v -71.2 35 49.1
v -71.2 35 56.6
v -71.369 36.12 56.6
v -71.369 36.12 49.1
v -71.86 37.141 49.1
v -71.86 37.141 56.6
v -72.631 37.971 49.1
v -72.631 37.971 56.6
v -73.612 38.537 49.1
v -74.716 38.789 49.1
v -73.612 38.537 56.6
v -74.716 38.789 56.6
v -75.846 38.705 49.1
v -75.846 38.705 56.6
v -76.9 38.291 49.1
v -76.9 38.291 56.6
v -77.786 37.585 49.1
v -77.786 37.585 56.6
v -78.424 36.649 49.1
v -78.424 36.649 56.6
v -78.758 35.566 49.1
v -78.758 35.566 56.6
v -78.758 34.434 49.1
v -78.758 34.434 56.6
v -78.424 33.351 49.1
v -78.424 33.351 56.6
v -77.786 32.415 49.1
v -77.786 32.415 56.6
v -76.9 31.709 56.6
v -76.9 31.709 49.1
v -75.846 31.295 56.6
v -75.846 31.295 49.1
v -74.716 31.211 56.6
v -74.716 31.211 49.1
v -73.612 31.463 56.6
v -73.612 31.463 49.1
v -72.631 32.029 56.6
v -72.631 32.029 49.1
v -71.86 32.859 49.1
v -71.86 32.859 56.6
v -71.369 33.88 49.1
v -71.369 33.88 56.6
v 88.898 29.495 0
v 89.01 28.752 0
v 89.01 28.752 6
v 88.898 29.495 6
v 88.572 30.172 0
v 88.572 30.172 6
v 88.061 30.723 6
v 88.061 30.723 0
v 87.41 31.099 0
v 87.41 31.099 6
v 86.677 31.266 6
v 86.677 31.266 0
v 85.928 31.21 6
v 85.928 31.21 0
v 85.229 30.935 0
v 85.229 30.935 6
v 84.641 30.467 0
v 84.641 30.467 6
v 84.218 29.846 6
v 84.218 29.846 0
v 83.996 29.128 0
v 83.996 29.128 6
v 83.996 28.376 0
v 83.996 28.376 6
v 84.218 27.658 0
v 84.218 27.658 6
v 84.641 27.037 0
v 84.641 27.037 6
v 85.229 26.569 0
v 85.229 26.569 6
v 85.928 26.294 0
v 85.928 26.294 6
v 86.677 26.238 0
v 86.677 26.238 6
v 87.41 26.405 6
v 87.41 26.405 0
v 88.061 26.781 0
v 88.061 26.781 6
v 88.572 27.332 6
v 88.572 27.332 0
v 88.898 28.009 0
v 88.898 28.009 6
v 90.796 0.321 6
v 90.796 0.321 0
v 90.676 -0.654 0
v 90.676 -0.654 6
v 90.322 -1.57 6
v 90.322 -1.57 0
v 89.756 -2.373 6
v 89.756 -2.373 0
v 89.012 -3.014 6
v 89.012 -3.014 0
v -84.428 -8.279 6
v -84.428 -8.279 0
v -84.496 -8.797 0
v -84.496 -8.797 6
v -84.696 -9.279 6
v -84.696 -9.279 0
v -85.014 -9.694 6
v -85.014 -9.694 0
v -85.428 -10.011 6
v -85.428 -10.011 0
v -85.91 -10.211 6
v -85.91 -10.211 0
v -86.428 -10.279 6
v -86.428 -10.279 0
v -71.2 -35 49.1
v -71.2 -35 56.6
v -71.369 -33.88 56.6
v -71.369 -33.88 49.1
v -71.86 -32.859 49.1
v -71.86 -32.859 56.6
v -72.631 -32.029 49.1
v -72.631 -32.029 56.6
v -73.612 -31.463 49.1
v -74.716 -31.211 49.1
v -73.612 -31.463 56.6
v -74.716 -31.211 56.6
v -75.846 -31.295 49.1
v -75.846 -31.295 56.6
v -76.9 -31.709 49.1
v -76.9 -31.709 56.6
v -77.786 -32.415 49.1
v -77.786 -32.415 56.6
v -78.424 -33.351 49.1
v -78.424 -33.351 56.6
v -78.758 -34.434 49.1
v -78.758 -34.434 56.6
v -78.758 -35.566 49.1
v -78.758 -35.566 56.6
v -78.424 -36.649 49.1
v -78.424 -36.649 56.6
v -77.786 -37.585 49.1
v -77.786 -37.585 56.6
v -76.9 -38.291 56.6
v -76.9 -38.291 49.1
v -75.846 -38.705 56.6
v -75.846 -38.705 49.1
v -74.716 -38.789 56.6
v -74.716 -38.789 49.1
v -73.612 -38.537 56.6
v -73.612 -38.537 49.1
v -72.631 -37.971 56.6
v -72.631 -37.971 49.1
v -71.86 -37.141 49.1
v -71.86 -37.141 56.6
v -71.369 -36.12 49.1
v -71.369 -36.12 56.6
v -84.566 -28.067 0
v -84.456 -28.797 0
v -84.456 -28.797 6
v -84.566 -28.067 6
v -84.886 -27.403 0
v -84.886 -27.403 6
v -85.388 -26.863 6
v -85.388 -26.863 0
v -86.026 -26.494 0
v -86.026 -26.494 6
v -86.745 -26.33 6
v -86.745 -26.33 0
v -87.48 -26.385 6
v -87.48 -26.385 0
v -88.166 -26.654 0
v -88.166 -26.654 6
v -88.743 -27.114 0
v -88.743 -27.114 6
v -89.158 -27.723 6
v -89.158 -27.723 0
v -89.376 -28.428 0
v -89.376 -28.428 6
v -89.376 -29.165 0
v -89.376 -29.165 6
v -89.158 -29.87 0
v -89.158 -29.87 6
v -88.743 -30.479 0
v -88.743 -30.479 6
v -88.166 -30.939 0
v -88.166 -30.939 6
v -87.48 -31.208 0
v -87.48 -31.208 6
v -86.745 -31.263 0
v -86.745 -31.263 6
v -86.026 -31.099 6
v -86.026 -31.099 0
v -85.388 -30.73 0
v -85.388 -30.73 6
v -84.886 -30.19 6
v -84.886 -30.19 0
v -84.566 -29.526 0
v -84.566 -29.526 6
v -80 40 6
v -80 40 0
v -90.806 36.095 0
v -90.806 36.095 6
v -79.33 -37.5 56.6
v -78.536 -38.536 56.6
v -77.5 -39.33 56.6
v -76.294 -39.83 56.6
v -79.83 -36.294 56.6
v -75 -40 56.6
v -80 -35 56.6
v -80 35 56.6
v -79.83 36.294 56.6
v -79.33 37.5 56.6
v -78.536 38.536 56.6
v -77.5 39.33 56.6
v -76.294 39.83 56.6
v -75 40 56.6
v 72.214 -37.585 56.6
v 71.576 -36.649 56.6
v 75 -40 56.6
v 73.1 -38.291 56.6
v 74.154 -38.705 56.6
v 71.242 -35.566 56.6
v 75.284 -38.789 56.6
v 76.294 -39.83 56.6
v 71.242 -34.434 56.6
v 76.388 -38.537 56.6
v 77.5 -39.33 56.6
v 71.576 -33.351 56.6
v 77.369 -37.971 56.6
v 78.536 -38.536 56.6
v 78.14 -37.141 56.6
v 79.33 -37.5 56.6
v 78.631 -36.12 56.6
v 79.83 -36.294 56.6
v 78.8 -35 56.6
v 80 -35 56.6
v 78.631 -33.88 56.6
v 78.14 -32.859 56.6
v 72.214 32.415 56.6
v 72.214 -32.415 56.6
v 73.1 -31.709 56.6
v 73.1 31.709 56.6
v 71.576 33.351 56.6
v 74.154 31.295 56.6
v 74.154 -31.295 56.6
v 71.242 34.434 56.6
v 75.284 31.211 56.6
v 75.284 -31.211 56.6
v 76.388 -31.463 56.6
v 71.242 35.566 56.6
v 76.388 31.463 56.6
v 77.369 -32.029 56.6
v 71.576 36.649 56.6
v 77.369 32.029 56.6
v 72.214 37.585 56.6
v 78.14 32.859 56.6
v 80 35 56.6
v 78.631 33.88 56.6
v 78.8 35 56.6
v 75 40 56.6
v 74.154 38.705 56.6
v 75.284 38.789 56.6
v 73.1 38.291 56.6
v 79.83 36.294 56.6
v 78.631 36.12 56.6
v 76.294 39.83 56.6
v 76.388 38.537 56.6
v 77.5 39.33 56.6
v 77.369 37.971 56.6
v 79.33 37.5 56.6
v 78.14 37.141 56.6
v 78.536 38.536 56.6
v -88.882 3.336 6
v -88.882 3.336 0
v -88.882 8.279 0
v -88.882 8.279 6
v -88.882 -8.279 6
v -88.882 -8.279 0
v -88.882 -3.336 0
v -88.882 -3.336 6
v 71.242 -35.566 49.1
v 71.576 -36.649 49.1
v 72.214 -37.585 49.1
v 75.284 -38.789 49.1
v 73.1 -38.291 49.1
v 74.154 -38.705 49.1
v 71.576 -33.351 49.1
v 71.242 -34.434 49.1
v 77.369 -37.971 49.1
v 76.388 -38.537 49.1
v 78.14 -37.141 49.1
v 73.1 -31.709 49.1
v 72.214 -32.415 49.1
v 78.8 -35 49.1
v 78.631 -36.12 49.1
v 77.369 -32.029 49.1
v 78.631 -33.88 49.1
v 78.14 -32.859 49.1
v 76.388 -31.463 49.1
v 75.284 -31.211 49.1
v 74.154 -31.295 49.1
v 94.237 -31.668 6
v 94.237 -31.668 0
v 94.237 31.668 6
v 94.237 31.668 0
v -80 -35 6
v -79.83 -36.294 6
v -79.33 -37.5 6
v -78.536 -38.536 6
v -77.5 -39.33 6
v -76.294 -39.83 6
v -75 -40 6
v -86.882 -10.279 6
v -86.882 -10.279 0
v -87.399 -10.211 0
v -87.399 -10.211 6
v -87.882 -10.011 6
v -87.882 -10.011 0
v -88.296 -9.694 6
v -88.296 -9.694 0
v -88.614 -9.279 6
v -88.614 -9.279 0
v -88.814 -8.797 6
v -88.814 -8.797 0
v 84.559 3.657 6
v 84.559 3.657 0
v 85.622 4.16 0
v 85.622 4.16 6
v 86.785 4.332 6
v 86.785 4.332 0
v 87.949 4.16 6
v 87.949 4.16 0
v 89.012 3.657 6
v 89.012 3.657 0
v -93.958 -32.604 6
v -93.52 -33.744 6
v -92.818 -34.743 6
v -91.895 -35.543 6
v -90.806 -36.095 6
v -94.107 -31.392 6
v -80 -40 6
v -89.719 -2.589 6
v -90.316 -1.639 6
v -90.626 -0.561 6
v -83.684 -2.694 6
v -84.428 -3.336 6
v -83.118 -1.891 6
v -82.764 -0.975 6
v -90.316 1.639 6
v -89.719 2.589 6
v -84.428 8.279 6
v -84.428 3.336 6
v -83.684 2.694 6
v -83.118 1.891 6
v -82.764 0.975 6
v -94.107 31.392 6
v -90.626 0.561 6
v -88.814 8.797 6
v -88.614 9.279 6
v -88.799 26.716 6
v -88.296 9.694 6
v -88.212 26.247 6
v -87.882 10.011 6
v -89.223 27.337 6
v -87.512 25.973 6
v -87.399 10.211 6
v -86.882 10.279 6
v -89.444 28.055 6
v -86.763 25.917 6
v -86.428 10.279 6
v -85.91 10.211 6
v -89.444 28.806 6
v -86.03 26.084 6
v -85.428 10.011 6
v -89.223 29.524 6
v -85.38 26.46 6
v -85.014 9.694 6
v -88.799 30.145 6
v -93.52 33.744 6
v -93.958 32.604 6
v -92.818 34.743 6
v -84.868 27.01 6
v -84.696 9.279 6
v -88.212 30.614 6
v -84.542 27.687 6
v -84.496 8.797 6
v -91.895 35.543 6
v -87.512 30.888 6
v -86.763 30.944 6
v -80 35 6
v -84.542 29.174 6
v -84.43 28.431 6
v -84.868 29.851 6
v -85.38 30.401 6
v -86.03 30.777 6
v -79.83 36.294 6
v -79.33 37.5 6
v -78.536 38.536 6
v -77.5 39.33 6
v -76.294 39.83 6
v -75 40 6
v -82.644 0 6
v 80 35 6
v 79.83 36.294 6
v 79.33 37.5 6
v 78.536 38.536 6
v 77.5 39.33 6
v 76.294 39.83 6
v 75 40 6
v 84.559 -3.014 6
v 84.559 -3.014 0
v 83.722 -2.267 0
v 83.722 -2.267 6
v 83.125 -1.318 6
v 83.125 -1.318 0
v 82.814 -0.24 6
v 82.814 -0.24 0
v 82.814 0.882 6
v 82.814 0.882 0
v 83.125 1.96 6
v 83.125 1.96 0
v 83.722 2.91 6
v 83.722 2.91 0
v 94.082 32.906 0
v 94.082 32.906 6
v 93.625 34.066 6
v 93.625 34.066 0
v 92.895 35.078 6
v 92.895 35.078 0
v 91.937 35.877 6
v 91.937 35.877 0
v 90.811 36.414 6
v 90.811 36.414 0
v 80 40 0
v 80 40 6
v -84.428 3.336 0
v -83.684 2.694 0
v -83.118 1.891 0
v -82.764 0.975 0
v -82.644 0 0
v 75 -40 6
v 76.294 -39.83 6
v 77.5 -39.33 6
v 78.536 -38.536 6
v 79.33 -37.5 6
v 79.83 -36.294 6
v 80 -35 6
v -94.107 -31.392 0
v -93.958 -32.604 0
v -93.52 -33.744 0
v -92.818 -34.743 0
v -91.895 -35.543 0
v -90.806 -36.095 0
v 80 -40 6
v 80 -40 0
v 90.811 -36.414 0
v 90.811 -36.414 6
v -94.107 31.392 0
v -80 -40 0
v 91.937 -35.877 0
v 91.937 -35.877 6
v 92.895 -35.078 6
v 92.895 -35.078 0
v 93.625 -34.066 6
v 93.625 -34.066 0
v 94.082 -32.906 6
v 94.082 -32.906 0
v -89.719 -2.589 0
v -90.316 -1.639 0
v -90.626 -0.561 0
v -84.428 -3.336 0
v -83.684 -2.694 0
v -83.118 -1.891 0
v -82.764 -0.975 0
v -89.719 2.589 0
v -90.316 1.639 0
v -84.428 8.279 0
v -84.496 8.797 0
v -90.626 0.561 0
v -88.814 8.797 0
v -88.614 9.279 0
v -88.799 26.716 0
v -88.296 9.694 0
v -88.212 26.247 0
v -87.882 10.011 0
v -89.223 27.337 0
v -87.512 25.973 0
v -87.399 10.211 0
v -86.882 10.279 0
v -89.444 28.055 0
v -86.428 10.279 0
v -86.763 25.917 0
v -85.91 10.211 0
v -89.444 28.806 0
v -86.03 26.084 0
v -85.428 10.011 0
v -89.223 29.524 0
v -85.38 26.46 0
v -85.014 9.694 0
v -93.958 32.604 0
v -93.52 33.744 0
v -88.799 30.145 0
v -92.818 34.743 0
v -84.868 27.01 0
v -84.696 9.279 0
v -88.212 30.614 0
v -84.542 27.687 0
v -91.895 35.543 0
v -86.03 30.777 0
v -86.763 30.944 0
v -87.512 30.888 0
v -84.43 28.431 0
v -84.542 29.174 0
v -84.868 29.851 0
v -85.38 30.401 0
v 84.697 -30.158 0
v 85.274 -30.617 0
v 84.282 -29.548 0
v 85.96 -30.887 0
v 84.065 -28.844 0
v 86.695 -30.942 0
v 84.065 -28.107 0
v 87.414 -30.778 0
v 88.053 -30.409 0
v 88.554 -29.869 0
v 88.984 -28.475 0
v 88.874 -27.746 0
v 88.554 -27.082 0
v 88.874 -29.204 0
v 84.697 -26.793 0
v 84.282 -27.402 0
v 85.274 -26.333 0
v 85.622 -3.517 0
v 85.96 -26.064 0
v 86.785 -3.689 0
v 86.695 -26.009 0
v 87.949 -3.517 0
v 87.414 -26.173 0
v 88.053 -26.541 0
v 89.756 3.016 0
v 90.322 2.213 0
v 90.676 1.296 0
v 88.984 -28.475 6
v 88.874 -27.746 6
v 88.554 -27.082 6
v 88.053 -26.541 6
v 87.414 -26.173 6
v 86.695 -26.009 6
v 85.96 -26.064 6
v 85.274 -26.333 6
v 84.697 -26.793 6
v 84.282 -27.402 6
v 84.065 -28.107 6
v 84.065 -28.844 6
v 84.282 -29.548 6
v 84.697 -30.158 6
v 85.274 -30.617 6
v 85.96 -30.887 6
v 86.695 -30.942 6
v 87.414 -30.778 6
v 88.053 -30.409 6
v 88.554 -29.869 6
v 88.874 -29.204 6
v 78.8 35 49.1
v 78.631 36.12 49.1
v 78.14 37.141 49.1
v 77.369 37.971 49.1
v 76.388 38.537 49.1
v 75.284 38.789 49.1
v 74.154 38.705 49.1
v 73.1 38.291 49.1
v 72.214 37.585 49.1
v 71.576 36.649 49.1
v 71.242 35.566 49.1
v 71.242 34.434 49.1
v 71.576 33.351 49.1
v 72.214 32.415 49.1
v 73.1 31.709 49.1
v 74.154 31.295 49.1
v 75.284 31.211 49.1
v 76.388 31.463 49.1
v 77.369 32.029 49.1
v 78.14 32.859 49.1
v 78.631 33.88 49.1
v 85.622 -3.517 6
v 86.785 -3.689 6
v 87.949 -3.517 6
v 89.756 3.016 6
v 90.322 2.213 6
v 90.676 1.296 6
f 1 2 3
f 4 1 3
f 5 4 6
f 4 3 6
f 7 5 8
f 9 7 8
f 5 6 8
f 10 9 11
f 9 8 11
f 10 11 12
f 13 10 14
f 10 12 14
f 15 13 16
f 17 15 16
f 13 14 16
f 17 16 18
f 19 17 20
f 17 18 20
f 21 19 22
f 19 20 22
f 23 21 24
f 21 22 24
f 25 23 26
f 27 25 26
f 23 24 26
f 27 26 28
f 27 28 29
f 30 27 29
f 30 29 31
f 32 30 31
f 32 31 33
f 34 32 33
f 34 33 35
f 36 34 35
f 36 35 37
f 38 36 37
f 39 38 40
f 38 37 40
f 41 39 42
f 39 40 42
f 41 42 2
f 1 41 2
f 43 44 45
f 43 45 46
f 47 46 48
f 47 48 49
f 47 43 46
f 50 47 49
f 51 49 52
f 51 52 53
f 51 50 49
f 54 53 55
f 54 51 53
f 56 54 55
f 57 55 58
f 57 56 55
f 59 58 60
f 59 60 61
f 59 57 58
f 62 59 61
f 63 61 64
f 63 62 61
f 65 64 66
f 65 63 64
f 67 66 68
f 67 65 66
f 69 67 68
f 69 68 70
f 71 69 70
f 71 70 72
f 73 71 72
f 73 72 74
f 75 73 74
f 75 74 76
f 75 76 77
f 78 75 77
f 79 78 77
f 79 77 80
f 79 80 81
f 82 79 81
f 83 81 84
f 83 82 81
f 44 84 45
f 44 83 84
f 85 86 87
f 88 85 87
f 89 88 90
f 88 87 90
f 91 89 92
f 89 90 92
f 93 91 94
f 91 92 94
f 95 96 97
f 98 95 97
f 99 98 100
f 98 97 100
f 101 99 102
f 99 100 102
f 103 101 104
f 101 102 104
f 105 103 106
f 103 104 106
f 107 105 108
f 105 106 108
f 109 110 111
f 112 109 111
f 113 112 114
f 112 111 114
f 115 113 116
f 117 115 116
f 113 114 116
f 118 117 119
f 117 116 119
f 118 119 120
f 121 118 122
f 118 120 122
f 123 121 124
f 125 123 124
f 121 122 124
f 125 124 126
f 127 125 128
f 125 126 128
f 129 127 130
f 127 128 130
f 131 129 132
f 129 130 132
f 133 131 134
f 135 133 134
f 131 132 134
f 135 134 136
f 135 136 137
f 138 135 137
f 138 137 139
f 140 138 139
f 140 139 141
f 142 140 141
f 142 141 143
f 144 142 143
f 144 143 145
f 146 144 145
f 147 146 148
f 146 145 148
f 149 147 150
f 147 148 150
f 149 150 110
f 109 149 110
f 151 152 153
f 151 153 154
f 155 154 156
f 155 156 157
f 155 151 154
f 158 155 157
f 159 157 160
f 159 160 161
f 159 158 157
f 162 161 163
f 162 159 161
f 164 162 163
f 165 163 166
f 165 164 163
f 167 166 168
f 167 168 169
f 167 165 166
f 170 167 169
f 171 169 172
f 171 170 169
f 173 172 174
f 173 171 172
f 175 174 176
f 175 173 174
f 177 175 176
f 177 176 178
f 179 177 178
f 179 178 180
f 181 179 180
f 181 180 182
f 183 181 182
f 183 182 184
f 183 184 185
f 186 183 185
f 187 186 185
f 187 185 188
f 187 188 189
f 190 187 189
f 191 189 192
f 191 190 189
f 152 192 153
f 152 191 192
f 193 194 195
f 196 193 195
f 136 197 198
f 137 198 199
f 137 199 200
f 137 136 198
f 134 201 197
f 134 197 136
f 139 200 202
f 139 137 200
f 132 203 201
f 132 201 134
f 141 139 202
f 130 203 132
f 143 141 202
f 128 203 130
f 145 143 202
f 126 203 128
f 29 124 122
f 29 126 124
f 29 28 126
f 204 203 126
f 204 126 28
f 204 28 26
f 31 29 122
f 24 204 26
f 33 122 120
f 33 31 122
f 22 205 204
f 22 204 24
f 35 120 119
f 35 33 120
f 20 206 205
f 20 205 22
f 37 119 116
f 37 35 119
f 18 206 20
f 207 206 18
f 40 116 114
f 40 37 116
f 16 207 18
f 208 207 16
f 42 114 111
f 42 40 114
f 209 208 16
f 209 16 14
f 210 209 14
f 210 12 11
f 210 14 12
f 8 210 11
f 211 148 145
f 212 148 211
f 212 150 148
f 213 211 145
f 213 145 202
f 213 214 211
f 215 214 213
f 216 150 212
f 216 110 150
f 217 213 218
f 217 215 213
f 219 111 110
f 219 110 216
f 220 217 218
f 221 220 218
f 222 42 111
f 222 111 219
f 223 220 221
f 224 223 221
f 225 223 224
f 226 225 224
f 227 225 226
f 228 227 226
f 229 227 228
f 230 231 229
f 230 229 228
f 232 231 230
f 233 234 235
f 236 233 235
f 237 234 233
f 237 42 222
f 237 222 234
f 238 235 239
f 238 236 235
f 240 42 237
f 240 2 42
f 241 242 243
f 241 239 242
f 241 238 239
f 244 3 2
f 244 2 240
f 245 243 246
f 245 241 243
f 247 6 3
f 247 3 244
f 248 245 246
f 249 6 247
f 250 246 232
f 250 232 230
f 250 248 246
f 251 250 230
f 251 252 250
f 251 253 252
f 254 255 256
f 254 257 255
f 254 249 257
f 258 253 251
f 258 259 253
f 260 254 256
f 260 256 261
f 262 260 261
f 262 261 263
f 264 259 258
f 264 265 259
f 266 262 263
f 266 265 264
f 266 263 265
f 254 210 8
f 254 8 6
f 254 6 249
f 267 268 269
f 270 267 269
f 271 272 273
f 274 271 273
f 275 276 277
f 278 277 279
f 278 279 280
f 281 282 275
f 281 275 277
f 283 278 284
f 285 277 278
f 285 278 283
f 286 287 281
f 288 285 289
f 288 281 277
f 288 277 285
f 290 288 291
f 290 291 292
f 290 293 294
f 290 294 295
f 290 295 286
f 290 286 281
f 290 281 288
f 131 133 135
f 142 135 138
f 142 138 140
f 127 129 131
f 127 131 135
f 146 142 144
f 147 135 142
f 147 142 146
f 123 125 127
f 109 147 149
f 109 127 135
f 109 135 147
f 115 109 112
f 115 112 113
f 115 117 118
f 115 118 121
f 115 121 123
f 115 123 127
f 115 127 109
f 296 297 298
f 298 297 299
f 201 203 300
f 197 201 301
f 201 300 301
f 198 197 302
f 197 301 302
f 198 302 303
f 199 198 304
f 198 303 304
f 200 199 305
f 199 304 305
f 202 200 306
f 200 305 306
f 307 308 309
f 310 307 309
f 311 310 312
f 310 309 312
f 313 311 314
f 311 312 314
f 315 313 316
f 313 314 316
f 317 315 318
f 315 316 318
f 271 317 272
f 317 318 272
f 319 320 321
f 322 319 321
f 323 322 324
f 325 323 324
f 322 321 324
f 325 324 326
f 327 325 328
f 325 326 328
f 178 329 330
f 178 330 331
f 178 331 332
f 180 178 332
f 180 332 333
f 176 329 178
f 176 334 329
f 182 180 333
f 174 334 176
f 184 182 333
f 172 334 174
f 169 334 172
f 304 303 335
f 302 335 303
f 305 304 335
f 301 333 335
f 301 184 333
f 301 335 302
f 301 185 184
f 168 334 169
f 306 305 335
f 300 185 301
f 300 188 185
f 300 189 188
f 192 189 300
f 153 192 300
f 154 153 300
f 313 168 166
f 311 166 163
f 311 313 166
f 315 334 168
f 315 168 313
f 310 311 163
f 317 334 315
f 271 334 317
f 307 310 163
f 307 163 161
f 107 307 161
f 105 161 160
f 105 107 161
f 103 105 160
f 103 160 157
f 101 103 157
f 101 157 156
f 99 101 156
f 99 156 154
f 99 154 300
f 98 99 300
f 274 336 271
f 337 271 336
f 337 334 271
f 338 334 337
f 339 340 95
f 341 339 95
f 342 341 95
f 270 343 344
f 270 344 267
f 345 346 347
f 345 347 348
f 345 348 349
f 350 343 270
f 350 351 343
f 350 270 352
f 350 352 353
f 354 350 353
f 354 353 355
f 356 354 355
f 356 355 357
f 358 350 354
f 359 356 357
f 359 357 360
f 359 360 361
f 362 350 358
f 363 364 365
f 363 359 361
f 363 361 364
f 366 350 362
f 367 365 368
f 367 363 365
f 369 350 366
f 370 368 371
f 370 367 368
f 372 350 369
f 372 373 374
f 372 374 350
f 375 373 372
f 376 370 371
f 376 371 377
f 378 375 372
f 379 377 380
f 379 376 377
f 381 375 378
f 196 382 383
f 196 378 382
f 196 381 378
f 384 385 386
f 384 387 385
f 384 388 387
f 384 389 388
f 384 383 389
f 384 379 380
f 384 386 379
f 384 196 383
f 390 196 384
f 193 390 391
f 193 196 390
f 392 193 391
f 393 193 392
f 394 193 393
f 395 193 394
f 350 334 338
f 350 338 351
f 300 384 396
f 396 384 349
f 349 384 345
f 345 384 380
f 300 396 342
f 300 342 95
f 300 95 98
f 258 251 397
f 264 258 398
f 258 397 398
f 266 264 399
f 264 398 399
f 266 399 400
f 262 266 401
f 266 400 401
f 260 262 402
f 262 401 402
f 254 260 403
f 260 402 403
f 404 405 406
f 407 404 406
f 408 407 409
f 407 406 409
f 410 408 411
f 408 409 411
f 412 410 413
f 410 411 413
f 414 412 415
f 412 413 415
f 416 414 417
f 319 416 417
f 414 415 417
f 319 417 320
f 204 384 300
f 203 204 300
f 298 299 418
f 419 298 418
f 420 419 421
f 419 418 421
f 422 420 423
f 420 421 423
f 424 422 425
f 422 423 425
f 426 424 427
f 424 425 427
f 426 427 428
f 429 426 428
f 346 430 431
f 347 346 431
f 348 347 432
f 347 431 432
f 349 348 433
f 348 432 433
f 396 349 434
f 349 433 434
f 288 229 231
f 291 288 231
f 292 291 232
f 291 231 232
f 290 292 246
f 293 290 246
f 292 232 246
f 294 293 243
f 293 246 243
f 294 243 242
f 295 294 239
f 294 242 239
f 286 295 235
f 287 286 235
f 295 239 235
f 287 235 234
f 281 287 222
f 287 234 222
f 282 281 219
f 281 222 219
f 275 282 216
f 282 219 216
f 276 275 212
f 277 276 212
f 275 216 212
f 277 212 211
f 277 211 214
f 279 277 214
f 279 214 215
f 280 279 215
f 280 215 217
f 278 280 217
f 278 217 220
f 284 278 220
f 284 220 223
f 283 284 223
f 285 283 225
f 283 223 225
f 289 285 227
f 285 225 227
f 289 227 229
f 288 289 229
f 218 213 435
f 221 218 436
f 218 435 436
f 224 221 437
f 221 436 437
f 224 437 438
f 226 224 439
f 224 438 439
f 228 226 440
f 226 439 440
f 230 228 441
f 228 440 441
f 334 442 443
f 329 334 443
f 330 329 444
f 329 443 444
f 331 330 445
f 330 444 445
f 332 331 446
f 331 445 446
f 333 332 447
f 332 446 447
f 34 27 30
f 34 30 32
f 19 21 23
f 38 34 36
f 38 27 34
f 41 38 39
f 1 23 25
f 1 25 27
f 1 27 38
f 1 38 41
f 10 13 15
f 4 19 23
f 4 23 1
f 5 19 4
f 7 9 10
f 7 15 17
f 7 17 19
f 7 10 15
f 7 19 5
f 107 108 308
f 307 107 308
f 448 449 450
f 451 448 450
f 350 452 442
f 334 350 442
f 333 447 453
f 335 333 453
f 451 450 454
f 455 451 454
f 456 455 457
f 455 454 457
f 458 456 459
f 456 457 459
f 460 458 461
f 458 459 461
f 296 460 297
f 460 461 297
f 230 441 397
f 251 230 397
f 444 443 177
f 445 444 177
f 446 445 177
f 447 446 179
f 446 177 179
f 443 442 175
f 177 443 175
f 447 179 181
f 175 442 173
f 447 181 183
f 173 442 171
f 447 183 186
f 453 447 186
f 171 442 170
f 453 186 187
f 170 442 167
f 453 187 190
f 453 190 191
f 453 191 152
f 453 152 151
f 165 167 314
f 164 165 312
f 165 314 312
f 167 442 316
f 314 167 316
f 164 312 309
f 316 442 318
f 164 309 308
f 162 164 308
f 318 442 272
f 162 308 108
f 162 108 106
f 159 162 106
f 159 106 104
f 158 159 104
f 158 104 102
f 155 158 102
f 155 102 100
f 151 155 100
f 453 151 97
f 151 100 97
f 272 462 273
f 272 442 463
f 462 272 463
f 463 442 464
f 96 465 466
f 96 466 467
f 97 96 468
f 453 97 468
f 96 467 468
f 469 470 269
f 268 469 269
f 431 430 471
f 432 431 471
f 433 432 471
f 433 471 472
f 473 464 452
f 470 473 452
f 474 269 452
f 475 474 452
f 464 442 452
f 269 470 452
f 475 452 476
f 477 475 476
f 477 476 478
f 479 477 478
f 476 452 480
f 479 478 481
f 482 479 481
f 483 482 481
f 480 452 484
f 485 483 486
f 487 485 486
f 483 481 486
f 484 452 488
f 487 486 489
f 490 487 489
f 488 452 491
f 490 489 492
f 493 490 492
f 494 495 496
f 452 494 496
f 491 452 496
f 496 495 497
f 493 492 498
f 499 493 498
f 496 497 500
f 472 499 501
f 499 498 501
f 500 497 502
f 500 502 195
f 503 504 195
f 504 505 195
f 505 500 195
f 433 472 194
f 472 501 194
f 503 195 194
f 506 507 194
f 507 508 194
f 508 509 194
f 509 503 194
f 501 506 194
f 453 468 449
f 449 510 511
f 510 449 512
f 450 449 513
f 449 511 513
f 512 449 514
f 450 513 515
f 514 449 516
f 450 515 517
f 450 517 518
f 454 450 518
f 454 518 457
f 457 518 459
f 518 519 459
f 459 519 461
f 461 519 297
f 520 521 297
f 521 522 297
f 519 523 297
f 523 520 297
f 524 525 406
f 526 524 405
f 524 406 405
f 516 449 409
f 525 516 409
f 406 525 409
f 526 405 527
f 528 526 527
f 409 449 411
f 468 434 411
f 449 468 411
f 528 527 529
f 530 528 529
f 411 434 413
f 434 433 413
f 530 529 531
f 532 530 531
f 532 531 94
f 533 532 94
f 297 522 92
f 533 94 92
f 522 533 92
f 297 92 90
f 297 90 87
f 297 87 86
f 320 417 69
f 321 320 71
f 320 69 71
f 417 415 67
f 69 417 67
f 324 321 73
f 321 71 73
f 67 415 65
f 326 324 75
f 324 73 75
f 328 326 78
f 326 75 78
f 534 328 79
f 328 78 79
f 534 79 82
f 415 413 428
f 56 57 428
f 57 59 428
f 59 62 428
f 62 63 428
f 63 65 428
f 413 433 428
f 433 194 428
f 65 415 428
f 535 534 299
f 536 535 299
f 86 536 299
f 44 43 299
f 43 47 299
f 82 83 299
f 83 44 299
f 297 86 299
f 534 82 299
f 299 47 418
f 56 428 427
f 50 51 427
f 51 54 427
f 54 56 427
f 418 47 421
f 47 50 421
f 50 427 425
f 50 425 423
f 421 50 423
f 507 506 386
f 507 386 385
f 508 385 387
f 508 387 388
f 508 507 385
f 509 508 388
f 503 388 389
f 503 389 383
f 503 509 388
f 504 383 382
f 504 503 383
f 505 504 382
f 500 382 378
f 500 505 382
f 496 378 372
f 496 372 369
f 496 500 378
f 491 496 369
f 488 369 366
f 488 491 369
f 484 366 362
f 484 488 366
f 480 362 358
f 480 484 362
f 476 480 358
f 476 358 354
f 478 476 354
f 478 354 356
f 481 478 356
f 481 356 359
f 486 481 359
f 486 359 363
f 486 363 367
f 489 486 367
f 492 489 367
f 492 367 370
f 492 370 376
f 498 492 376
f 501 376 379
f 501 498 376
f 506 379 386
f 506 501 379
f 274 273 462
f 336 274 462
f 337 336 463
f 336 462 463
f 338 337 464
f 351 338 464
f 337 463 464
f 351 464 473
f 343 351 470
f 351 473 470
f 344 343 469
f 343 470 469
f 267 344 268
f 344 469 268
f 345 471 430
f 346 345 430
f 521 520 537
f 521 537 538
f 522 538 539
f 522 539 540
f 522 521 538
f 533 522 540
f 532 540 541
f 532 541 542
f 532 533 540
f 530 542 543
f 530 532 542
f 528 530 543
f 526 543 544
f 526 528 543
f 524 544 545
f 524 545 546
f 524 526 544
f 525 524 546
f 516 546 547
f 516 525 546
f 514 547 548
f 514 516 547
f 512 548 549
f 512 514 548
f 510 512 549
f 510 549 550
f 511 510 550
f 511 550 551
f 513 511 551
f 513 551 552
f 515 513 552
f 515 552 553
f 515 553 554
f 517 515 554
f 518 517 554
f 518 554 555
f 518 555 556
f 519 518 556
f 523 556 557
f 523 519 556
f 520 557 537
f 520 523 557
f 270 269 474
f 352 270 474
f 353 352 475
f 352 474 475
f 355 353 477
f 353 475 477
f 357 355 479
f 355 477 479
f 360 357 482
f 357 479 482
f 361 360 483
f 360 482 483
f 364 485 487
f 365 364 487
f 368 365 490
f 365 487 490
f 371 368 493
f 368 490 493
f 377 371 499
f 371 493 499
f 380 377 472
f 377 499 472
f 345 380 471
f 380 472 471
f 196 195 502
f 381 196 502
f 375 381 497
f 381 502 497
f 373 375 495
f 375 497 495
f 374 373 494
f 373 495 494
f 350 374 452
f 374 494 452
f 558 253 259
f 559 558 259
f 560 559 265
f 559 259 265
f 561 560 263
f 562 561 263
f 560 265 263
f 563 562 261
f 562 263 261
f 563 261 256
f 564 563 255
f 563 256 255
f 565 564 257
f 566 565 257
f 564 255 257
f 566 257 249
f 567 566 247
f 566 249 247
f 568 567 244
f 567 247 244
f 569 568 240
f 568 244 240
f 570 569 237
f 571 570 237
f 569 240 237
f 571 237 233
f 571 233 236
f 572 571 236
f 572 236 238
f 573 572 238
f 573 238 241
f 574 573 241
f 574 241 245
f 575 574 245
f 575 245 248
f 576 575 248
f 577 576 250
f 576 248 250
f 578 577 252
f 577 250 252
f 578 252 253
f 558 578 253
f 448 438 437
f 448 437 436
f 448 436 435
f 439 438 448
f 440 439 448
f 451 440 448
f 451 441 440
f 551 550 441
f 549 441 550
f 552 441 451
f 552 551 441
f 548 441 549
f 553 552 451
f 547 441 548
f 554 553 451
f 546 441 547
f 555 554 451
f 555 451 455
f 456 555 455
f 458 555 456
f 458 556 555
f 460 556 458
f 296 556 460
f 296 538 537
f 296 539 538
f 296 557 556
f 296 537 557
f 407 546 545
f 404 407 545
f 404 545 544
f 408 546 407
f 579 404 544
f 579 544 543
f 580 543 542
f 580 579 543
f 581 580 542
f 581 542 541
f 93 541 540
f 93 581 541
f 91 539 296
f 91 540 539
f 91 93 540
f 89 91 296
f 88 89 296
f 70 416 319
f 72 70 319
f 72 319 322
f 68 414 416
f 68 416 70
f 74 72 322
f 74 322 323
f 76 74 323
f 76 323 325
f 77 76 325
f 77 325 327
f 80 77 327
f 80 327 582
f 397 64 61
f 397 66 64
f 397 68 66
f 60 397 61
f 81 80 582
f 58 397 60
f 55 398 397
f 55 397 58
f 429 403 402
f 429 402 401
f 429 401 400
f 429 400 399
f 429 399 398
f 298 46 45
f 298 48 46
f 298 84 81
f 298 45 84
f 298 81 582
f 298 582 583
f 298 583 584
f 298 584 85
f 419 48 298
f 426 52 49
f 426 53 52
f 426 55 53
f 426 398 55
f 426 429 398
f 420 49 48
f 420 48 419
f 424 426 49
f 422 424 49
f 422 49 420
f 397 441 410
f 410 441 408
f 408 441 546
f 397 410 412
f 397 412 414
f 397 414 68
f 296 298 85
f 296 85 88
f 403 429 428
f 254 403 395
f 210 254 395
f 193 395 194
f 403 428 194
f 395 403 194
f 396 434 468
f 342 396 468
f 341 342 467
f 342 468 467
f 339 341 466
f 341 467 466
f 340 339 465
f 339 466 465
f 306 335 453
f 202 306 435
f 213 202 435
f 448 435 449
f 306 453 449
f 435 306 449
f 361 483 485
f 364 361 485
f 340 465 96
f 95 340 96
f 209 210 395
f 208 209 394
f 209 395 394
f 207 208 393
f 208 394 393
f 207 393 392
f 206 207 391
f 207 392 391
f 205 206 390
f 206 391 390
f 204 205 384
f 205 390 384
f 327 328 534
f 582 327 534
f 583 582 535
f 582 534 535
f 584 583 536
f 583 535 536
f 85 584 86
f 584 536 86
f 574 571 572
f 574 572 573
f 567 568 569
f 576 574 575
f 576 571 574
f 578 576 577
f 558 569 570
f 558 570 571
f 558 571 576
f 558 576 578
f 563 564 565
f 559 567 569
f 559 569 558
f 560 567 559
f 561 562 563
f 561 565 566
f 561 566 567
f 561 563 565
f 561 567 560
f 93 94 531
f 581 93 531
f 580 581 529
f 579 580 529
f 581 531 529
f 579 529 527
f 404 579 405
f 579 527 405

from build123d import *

# Parameters (mm, degrees)
F0_R     = 2.473433
F0_R_2   = 2.52096
F1_DEPTH = 6
F2_DEPTH = 34
F3_DEPTH = 6
F4_DEPTH = 56.6
F5_R     = 3.8
F6_DEPTH = 7.5


with BuildPart() as f1:
    # F0 (on Top) → F1 (new body)
    with BuildSketch(Plane.XY):
        with BuildLine():
            ThreePointArc((80, 35), (78.535534, 38.535534), (75, 40))
            Line((75, 40), (-75, 40))
            ThreePointArc((-75, 40), (-78.535534, 38.535534), (-80, 35))
            Line((-80, 35), (-80, -35))
            ThreePointArc((-80, -35), (-78.535534, -38.535534), (-75, -40))
            Line((-75, -40), (75, -40))
            ThreePointArc((75, -40), (78.535534, -38.535534), (80, -35))
            Line((80, -35), (80, 35))
        make_face()
        with BuildLine():
            ThreePointArc((-68, 34.468334), (-67.12132, 36.589654), (-65, 37.468334))
            Line((-65, 37.468334), (0, 37.468334))
            Line((0, 37.468334), (65, 37.468334))
            ThreePointArc((65, 37.468334), (67.12132, 36.589654), (68, 34.468334))
            Line((68, 34.468334), (68, 22.468334))
            ThreePointArc((68, 22.468334), (68.87868, 20.347013), (71, 19.468334))
            Line((71, 19.468334), (74.173963, 19.468334))
            ThreePointArc((74.173963, 19.468334), (76.295284, 18.589654), (77.173963, 16.468334))
            Line((77.173963, 16.468334), (77.173963, -16.485134))
            ThreePointArc((77.173963, -16.485134), (76.295284, -18.606454), (74.173963, -19.485134))
            Line((74.173963, -19.485134), (71, -19.485134))
            ThreePointArc((71, -19.485134), (68.87868, -20.363814), (68, -22.485134))
            Line((68, -22.485134), (68, -34.485134))
            ThreePointArc((68, -34.485134), (67.12132, -36.606454), (65, -37.485134))
            Line((65, -37.485134), (0, -37.485134))
            Line((0, -37.485134), (-65, -37.485134))
            ThreePointArc((-65, -37.485134), (-67.12132, -36.606454), (-68, -34.485134))
            Line((-68, -34.485134), (-68, -22.546155))
            ThreePointArc((-68, -22.546155), (-68.900143, -20.403586), (-71.060401, -19.546763))
            Line((-71.060401, -19.546763), (-74.027314, -19.60651))
            ThreePointArc((-74.027314, -19.60651), (-76.187572, -18.749687), (-77.087715, -16.607118))
            Line((-77.087715, -16.607118), (-77.087715, 16.468334))
            ThreePointArc((-77.087715, 16.468334), (-76.209036, 18.589654), (-74.087715, 19.468334))
            Line((-74.087715, 19.468334), (-71, 19.468334))
            ThreePointArc((-71, 19.468334), (-68.87868, 20.347013), (-68, 22.468334))
            Line((-68, 22.468334), (-68, 34.468334))
        make_face(mode=Mode.SUBTRACT)
        with BuildLine():
            Line((80, 40), (75, 40))
            ThreePointArc((75, 40), (78.535534, 38.535534), (80, 35))
            Line((80, 35), (80, -35))
            ThreePointArc((80, -35), (78.535534, -38.535534), (75, -40))
            Line((75, -40), (80, -40))
            Line((80, -40), (90.811371, -36.414082))
            ThreePointArc((90.811371, -36.414082), (93.291328, -34.594887), (94.237295, -31.668317))
            Line((94.237295, -31.668317), (94.237295, 31.668317))
            ThreePointArc((94.237295, 31.668317), (93.291328, 34.594887), (90.811371, 36.414082))
            Line((90.811371, 36.414082), (80, 40))
        make_face()
        with Locations((86.510646, -28.475207)):
            Circle(F0_R, mode=Mode.SUBTRACT)
        with BuildLine():
            ThreePointArc((90.796184, 0.321328), (90.322187, -1.570108), (89.012231, -3.014482))
            ThreePointArc((89.012231, -3.014482), (86.785394, -3.689461), (84.558557, -3.014482))
            ThreePointArc((84.558557, -3.014482), (82.774604, 0.321328), (84.558557, 3.657139))
            ThreePointArc((84.558557, 3.657139), (86.785394, 4.332118), (89.012231, 3.657139))
            ThreePointArc((89.012231, 3.657139), (90.322187, 2.212764), (90.796184, 0.321328))
        make_face(mode=Mode.SUBTRACT)
        with Locations((86.489025, 28.75185)):
            Circle(F0_R_2, mode=Mode.SUBTRACT)
        with BuildLine():
            ThreePointArc((-80, 35), (-78.535534, 38.535534), (-75, 40))
            Line((-75, 40), (-80, 40))
            Line((-80, 40), (-90.806432, 36.094616))
            ThreePointArc((-90.806432, 36.094616), (-93.199525, 34.264815), (-94.107032, 31.392273))
            Line((-94.107032, 31.392273), (-94.107032, -31.392273))
            ThreePointArc((-94.107032, -31.392273), (-93.199525, -34.264815), (-90.806432, -36.094616))
            Line((-90.806432, -36.094616), (-80, -40))
            Line((-80, -40), (-75, -40))
            ThreePointArc((-75, -40), (-78.535534, -38.535534), (-80, -35))
            Line((-80, -35), (-80, 35))
        make_face()
        with Locations((-86.929694, -28.796535)):
            Circle(F0_R, mode=Mode.SUBTRACT)
        with BuildLine():
            ThreePointArc((-84.428109, -8.279438), (-85.013896, -9.693651), (-86.428109, -10.279438))
            Line((-86.428109, -10.279438), (-86.881783, -10.279438))
            ThreePointArc((-86.881783, -10.279438), (-88.295997, -9.693651), (-88.881783, -8.279438))
            Line((-88.881783, -8.279438), (-88.881783, -3.335811))
            ThreePointArc((-88.881783, -3.335811), (-90.665736, 0), (-88.881783, 3.335811))
            Line((-88.881783, 3.335811), (-88.881783, 8.279438))
            ThreePointArc((-88.881783, 8.279438), (-88.295997, 9.693651), (-86.881783, 10.279438))
            Line((-86.881783, 10.279438), (-86.428109, 10.279438))
            ThreePointArc((-86.428109, 10.279438), (-85.013896, 9.693651), (-84.428109, 8.279438))
            Line((-84.428109, 8.279438), (-84.428109, 3.335811))
            ThreePointArc((-84.428109, 3.335811), (-83.118153, 1.891436), (-82.644156, 0))
            ThreePointArc((-82.644156, 0), (-83.118153, -1.891436), (-84.428109, -3.335811))
            Line((-84.428109, -3.335811), (-84.428109, -8.279438))
        make_face(mode=Mode.SUBTRACT)
        with Locations((-86.951315, 28.430521)):
            Circle(F0_R_2, mode=Mode.SUBTRACT)
    extrude(amount=F1_DEPTH)

    # F0 (on Top) → F2 (join)
    with BuildSketch(Plane.XY):
        with BuildLine():
            ThreePointArc((80, 35), (78.535534, 38.535534), (75, 40))
            Line((75, 40), (-75, 40))
            ThreePointArc((-75, 40), (-78.535534, 38.535534), (-80, 35))
            Line((-80, 35), (-80, -35))
            ThreePointArc((-80, -35), (-78.535534, -38.535534), (-75, -40))
            Line((-75, -40), (75, -40))
            ThreePointArc((75, -40), (78.535534, -38.535534), (80, -35))
            Line((80, -35), (80, 35))
        make_face()
        with BuildLine():
            ThreePointArc((-68, 34.468334), (-67.12132, 36.589654), (-65, 37.468334))
            Line((-65, 37.468334), (0, 37.468334))
            Line((0, 37.468334), (65, 37.468334))
            ThreePointArc((65, 37.468334), (67.12132, 36.589654), (68, 34.468334))
            Line((68, 34.468334), (68, 22.468334))
            ThreePointArc((68, 22.468334), (68.87868, 20.347013), (71, 19.468334))
            Line((71, 19.468334), (74.173963, 19.468334))
            ThreePointArc((74.173963, 19.468334), (76.295284, 18.589654), (77.173963, 16.468334))
            Line((77.173963, 16.468334), (77.173963, -16.485134))
            ThreePointArc((77.173963, -16.485134), (76.295284, -18.606454), (74.173963, -19.485134))
            Line((74.173963, -19.485134), (71, -19.485134))
            ThreePointArc((71, -19.485134), (68.87868, -20.363814), (68, -22.485134))
            Line((68, -22.485134), (68, -34.485134))
            ThreePointArc((68, -34.485134), (67.12132, -36.606454), (65, -37.485134))
            Line((65, -37.485134), (0, -37.485134))
            Line((0, -37.485134), (-65, -37.485134))
            ThreePointArc((-65, -37.485134), (-67.12132, -36.606454), (-68, -34.485134))
            Line((-68, -34.485134), (-68, -22.546155))
            ThreePointArc((-68, -22.546155), (-68.900143, -20.403586), (-71.060401, -19.546763))
            Line((-71.060401, -19.546763), (-74.027314, -19.60651))
            ThreePointArc((-74.027314, -19.60651), (-76.187572, -18.749687), (-77.087715, -16.607118))
            Line((-77.087715, -16.607118), (-77.087715, 16.468334))
            ThreePointArc((-77.087715, 16.468334), (-76.209036, 18.589654), (-74.087715, 19.468334))
            Line((-74.087715, 19.468334), (-71, 19.468334))
            ThreePointArc((-71, 19.468334), (-68.87868, 20.347013), (-68, 22.468334))
            Line((-68, 22.468334), (-68, 34.468334))
        make_face(mode=Mode.SUBTRACT)
    extrude(amount=F2_DEPTH)

    # F0 (on Top) → F3 (join)
    with BuildSketch(Plane.XY):
        with BuildLine():
            Line((0, 37.468334), (-65, 37.468334))
            ThreePointArc((-65, 37.468334), (-67.12132, 36.589654), (-68, 34.468334))
            Line((-68, 34.468334), (-68, 22.468334))
            ThreePointArc((-68, 22.468334), (-68.87868, 20.347013), (-71, 19.468334))
            Line((-71, 19.468334), (-74.087715, 19.468334))
            ThreePointArc((-74.087715, 19.468334), (-76.209036, 18.589654), (-77.087715, 16.468334))
            Line((-77.087715, 16.468334), (-77.087715, -16.607118))
            ThreePointArc((-77.087715, -16.607118), (-76.187572, -18.749687), (-74.027314, -19.60651))
            Line((-74.027314, -19.60651), (-71.060401, -19.546763))
            ThreePointArc((-71.060401, -19.546763), (-68.900143, -20.403586), (-68, -22.546155))
            Line((-68, -22.546155), (-68, -34.485134))
            ThreePointArc((-68, -34.485134), (-67.12132, -36.606454), (-65, -37.485134))
            Line((-65, -37.485134), (0, -37.485134))
            Line((0, -37.485134), (65, -37.485134))
            ThreePointArc((65, -37.485134), (67.12132, -36.606454), (68, -34.485134))
            Line((68, -34.485134), (68, -22.485134))
            ThreePointArc((68, -22.485134), (68.87868, -20.363814), (71, -19.485134))
            Line((71, -19.485134), (74.173963, -19.485134))
            ThreePointArc((74.173963, -19.485134), (76.295284, -18.606454), (77.173963, -16.485134))
            Line((77.173963, -16.485134), (77.173963, 16.468334))
            ThreePointArc((77.173963, 16.468334), (76.295284, 18.589654), (74.173963, 19.468334))
            Line((74.173963, 19.468334), (71, 19.468334))
            ThreePointArc((71, 19.468334), (68.87868, 20.347013), (68, 22.468334))
            Line((68, 22.468334), (68, 34.468334))
            ThreePointArc((68, 34.468334), (67.12132, 36.589654), (65, 37.468334))
            Line((65, 37.468334), (0, 37.468334))
        make_face()
        with BuildLine():
            ThreePointArc((80, 35), (78.535534, 38.535534), (75, 40))
            Line((75, 40), (-75, 40))
            ThreePointArc((-75, 40), (-78.535534, 38.535534), (-80, 35))
            Line((-80, 35), (-80, -35))
            ThreePointArc((-80, -35), (-78.535534, -38.535534), (-75, -40))
            Line((-75, -40), (75, -40))
            ThreePointArc((75, -40), (78.535534, -38.535534), (80, -35))
            Line((80, -35), (80, 35))
        make_face()
        with BuildLine():
            ThreePointArc((-68, 34.468334), (-67.12132, 36.589654), (-65, 37.468334))
            Line((-65, 37.468334), (0, 37.468334))
            Line((0, 37.468334), (65, 37.468334))
            ThreePointArc((65, 37.468334), (67.12132, 36.589654), (68, 34.468334))
            Line((68, 34.468334), (68, 22.468334))
            ThreePointArc((68, 22.468334), (68.87868, 20.347013), (71, 19.468334))
            Line((71, 19.468334), (74.173963, 19.468334))
            ThreePointArc((74.173963, 19.468334), (76.295284, 18.589654), (77.173963, 16.468334))
            Line((77.173963, 16.468334), (77.173963, -16.485134))
            ThreePointArc((77.173963, -16.485134), (76.295284, -18.606454), (74.173963, -19.485134))
            Line((74.173963, -19.485134), (71, -19.485134))
            ThreePointArc((71, -19.485134), (68.87868, -20.363814), (68, -22.485134))
            Line((68, -22.485134), (68, -34.485134))
            ThreePointArc((68, -34.485134), (67.12132, -36.606454), (65, -37.485134))
            Line((65, -37.485134), (0, -37.485134))
            Line((0, -37.485134), (-65, -37.485134))
            ThreePointArc((-65, -37.485134), (-67.12132, -36.606454), (-68, -34.485134))
            Line((-68, -34.485134), (-68, -22.546155))
            ThreePointArc((-68, -22.546155), (-68.900143, -20.403586), (-71.060401, -19.546763))
            Line((-71.060401, -19.546763), (-74.027314, -19.60651))
            ThreePointArc((-74.027314, -19.60651), (-76.187572, -18.749687), (-77.087715, -16.607118))
            Line((-77.087715, -16.607118), (-77.087715, 16.468334))
            ThreePointArc((-77.087715, 16.468334), (-76.209036, 18.589654), (-74.087715, 19.468334))
            Line((-74.087715, 19.468334), (-71, 19.468334))
            ThreePointArc((-71, 19.468334), (-68.87868, 20.347013), (-68, 22.468334))
            Line((-68, 22.468334), (-68, 34.468334))
        make_face(mode=Mode.SUBTRACT)
        with BuildLine():
            ThreePointArc((-80, 35), (-78.535534, 38.535534), (-75, 40))
            Line((-75, 40), (-80, 40))
            Line((-80, 40), (-90.806432, 36.094616))
            ThreePointArc((-90.806432, 36.094616), (-93.199525, 34.264815), (-94.107032, 31.392273))
            Line((-94.107032, 31.392273), (-94.107032, -31.392273))
            ThreePointArc((-94.107032, -31.392273), (-93.199525, -34.264815), (-90.806432, -36.094616))
            Line((-90.806432, -36.094616), (-80, -40))
            Line((-80, -40), (-75, -40))
            ThreePointArc((-75, -40), (-78.535534, -38.535534), (-80, -35))
            Line((-80, -35), (-80, 35))
        make_face()
        with Locations((-86.929694, -28.796535)):
            Circle(F0_R, mode=Mode.SUBTRACT)
        with BuildLine():
            ThreePointArc((-84.428109, -8.279438), (-85.013896, -9.693651), (-86.428109, -10.279438))
            Line((-86.428109, -10.279438), (-86.881783, -10.279438))
            ThreePointArc((-86.881783, -10.279438), (-88.295997, -9.693651), (-88.881783, -8.279438))
            Line((-88.881783, -8.279438), (-88.881783, -3.335811))
            ThreePointArc((-88.881783, -3.335811), (-90.665736, 0), (-88.881783, 3.335811))
            Line((-88.881783, 3.335811), (-88.881783, 8.279438))
            ThreePointArc((-88.881783, 8.279438), (-88.295997, 9.693651), (-86.881783, 10.279438))
            Line((-86.881783, 10.279438), (-86.428109, 10.279438))
            ThreePointArc((-86.428109, 10.279438), (-85.013896, 9.693651), (-84.428109, 8.279438))
            Line((-84.428109, 8.279438), (-84.428109, 3.335811))
            ThreePointArc((-84.428109, 3.335811), (-83.118153, 1.891436), (-82.644156, 0))
            ThreePointArc((-82.644156, 0), (-83.118153, -1.891436), (-84.428109, -3.335811))
            Line((-84.428109, -3.335811), (-84.428109, -8.279438))
        make_face(mode=Mode.SUBTRACT)
        with Locations((-86.951315, 28.430521)):
            Circle(F0_R_2, mode=Mode.SUBTRACT)
        with BuildLine():
            Line((80, 40), (75, 40))
            ThreePointArc((75, 40), (78.535534, 38.535534), (80, 35))
            Line((80, 35), (80, -35))
            ThreePointArc((80, -35), (78.535534, -38.535534), (75, -40))
            Line((75, -40), (80, -40))
            Line((80, -40), (90.811371, -36.414082))
            ThreePointArc((90.811371, -36.414082), (93.291328, -34.594887), (94.237295, -31.668317))
            Line((94.237295, -31.668317), (94.237295, 31.668317))
            ThreePointArc((94.237295, 31.668317), (93.291328, 34.594887), (90.811371, 36.414082))
            Line((90.811371, 36.414082), (80, 40))
        make_face()
        with Locations((86.510646, -28.475207)):
            Circle(F0_R, mode=Mode.SUBTRACT)
        with BuildLine():
            ThreePointArc((90.796184, 0.321328), (90.322187, -1.570108), (89.012231, -3.014482))
            ThreePointArc((89.012231, -3.014482), (86.785394, -3.689461), (84.558557, -3.014482))
            ThreePointArc((84.558557, -3.014482), (82.774604, 0.321328), (84.558557, 3.657139))
            ThreePointArc((84.558557, 3.657139), (86.785394, 4.332118), (89.012231, 3.657139))
            ThreePointArc((89.012231, 3.657139), (90.322187, 2.212764), (90.796184, 0.321328))
        make_face(mode=Mode.SUBTRACT)
        with Locations((86.489025, 28.75185)):
            Circle(F0_R_2, mode=Mode.SUBTRACT)
    extrude(amount=F3_DEPTH)

    # F0 (on Top) → F4 (join)
    with BuildSketch(Plane.XY):
        with BuildLine():
            ThreePointArc((80, 35), (78.535534, 38.535534), (75, 40))
            Line((75, 40), (-75, 40))
            ThreePointArc((-75, 40), (-78.535534, 38.535534), (-80, 35))
            Line((-80, 35), (-80, -35))
            ThreePointArc((-80, -35), (-78.535534, -38.535534), (-75, -40))
            Line((-75, -40), (75, -40))
            ThreePointArc((75, -40), (78.535534, -38.535534), (80, -35))
            Line((80, -35), (80, 35))
        make_face()
        with BuildLine():
            ThreePointArc((-68, 34.468334), (-67.12132, 36.589654), (-65, 37.468334))
            Line((-65, 37.468334), (0, 37.468334))
            Line((0, 37.468334), (65, 37.468334))
            ThreePointArc((65, 37.468334), (67.12132, 36.589654), (68, 34.468334))
            Line((68, 34.468334), (68, 22.468334))
            ThreePointArc((68, 22.468334), (68.87868, 20.347013), (71, 19.468334))
            Line((71, 19.468334), (74.173963, 19.468334))
            ThreePointArc((74.173963, 19.468334), (76.295284, 18.589654), (77.173963, 16.468334))
            Line((77.173963, 16.468334), (77.173963, -16.485134))
            ThreePointArc((77.173963, -16.485134), (76.295284, -18.606454), (74.173963, -19.485134))
            Line((74.173963, -19.485134), (71, -19.485134))
            ThreePointArc((71, -19.485134), (68.87868, -20.363814), (68, -22.485134))
            Line((68, -22.485134), (68, -34.485134))
            ThreePointArc((68, -34.485134), (67.12132, -36.606454), (65, -37.485134))
            Line((65, -37.485134), (0, -37.485134))
            Line((0, -37.485134), (-65, -37.485134))
            ThreePointArc((-65, -37.485134), (-67.12132, -36.606454), (-68, -34.485134))
            Line((-68, -34.485134), (-68, -22.546155))
            ThreePointArc((-68, -22.546155), (-68.900143, -20.403586), (-71.060401, -19.546763))
            Line((-71.060401, -19.546763), (-74.027314, -19.60651))
            ThreePointArc((-74.027314, -19.60651), (-76.187572, -18.749687), (-77.087715, -16.607118))
            Line((-77.087715, -16.607118), (-77.087715, 16.468334))
            ThreePointArc((-77.087715, 16.468334), (-76.209036, 18.589654), (-74.087715, 19.468334))
            Line((-74.087715, 19.468334), (-71, 19.468334))
            ThreePointArc((-71, 19.468334), (-68.87868, 20.347013), (-68, 22.468334))
            Line((-68, 22.468334), (-68, 34.468334))
        make_face(mode=Mode.SUBTRACT)
        with BuildLine():
            Line((0, 37.468334), (-65, 37.468334))
            ThreePointArc((-65, 37.468334), (-67.12132, 36.589654), (-68, 34.468334))
            Line((-68, 34.468334), (-68, 22.468334))
            ThreePointArc((-68, 22.468334), (-68.87868, 20.347013), (-71, 19.468334))
            Line((-71, 19.468334), (-74.087715, 19.468334))
            ThreePointArc((-74.087715, 19.468334), (-76.209036, 18.589654), (-77.087715, 16.468334))
            Line((-77.087715, 16.468334), (-77.087715, -16.607118))
            ThreePointArc((-77.087715, -16.607118), (-76.187572, -18.749687), (-74.027314, -19.60651))
            Line((-74.027314, -19.60651), (-71.060401, -19.546763))
            ThreePointArc((-71.060401, -19.546763), (-68.900143, -20.403586), (-68, -22.546155))
            Line((-68, -22.546155), (-68, -34.485134))
            ThreePointArc((-68, -34.485134), (-67.12132, -36.606454), (-65, -37.485134))
            Line((-65, -37.485134), (0, -37.485134))
            Line((0, -37.485134), (65, -37.485134))
            ThreePointArc((65, -37.485134), (67.12132, -36.606454), (68, -34.485134))
            Line((68, -34.485134), (68, -22.485134))
            ThreePointArc((68, -22.485134), (68.87868, -20.363814), (71, -19.485134))
            Line((71, -19.485134), (74.173963, -19.485134))
            ThreePointArc((74.173963, -19.485134), (76.295284, -18.606454), (77.173963, -16.485134))
            Line((77.173963, -16.485134), (77.173963, 16.468334))
            ThreePointArc((77.173963, 16.468334), (76.295284, 18.589654), (74.173963, 19.468334))
            Line((74.173963, 19.468334), (71, 19.468334))
            ThreePointArc((71, 19.468334), (68.87868, 20.347013), (68, 22.468334))
            Line((68, 22.468334), (68, 34.468334))
            ThreePointArc((68, 34.468334), (67.12132, 36.589654), (65, 37.468334))
            Line((65, 37.468334), (0, 37.468334))
        make_face()
    extrude(amount=F4_DEPTH)

    # F5 (on face) → F6 (cut)
    with BuildSketch(Plane.XY.offset(56.6)):
        with Locations((-75, 35)):
            Circle(F5_R)
        with Locations((-75, -35)):
            Circle(F5_R)
        with Locations((75, -35)):
            Circle(F5_R)
        with Locations((75, 35)):
            Circle(F5_R)
    extrude(amount=-F6_DEPTH, mode=Mode.SUBTRACT)


solid = f1.part
